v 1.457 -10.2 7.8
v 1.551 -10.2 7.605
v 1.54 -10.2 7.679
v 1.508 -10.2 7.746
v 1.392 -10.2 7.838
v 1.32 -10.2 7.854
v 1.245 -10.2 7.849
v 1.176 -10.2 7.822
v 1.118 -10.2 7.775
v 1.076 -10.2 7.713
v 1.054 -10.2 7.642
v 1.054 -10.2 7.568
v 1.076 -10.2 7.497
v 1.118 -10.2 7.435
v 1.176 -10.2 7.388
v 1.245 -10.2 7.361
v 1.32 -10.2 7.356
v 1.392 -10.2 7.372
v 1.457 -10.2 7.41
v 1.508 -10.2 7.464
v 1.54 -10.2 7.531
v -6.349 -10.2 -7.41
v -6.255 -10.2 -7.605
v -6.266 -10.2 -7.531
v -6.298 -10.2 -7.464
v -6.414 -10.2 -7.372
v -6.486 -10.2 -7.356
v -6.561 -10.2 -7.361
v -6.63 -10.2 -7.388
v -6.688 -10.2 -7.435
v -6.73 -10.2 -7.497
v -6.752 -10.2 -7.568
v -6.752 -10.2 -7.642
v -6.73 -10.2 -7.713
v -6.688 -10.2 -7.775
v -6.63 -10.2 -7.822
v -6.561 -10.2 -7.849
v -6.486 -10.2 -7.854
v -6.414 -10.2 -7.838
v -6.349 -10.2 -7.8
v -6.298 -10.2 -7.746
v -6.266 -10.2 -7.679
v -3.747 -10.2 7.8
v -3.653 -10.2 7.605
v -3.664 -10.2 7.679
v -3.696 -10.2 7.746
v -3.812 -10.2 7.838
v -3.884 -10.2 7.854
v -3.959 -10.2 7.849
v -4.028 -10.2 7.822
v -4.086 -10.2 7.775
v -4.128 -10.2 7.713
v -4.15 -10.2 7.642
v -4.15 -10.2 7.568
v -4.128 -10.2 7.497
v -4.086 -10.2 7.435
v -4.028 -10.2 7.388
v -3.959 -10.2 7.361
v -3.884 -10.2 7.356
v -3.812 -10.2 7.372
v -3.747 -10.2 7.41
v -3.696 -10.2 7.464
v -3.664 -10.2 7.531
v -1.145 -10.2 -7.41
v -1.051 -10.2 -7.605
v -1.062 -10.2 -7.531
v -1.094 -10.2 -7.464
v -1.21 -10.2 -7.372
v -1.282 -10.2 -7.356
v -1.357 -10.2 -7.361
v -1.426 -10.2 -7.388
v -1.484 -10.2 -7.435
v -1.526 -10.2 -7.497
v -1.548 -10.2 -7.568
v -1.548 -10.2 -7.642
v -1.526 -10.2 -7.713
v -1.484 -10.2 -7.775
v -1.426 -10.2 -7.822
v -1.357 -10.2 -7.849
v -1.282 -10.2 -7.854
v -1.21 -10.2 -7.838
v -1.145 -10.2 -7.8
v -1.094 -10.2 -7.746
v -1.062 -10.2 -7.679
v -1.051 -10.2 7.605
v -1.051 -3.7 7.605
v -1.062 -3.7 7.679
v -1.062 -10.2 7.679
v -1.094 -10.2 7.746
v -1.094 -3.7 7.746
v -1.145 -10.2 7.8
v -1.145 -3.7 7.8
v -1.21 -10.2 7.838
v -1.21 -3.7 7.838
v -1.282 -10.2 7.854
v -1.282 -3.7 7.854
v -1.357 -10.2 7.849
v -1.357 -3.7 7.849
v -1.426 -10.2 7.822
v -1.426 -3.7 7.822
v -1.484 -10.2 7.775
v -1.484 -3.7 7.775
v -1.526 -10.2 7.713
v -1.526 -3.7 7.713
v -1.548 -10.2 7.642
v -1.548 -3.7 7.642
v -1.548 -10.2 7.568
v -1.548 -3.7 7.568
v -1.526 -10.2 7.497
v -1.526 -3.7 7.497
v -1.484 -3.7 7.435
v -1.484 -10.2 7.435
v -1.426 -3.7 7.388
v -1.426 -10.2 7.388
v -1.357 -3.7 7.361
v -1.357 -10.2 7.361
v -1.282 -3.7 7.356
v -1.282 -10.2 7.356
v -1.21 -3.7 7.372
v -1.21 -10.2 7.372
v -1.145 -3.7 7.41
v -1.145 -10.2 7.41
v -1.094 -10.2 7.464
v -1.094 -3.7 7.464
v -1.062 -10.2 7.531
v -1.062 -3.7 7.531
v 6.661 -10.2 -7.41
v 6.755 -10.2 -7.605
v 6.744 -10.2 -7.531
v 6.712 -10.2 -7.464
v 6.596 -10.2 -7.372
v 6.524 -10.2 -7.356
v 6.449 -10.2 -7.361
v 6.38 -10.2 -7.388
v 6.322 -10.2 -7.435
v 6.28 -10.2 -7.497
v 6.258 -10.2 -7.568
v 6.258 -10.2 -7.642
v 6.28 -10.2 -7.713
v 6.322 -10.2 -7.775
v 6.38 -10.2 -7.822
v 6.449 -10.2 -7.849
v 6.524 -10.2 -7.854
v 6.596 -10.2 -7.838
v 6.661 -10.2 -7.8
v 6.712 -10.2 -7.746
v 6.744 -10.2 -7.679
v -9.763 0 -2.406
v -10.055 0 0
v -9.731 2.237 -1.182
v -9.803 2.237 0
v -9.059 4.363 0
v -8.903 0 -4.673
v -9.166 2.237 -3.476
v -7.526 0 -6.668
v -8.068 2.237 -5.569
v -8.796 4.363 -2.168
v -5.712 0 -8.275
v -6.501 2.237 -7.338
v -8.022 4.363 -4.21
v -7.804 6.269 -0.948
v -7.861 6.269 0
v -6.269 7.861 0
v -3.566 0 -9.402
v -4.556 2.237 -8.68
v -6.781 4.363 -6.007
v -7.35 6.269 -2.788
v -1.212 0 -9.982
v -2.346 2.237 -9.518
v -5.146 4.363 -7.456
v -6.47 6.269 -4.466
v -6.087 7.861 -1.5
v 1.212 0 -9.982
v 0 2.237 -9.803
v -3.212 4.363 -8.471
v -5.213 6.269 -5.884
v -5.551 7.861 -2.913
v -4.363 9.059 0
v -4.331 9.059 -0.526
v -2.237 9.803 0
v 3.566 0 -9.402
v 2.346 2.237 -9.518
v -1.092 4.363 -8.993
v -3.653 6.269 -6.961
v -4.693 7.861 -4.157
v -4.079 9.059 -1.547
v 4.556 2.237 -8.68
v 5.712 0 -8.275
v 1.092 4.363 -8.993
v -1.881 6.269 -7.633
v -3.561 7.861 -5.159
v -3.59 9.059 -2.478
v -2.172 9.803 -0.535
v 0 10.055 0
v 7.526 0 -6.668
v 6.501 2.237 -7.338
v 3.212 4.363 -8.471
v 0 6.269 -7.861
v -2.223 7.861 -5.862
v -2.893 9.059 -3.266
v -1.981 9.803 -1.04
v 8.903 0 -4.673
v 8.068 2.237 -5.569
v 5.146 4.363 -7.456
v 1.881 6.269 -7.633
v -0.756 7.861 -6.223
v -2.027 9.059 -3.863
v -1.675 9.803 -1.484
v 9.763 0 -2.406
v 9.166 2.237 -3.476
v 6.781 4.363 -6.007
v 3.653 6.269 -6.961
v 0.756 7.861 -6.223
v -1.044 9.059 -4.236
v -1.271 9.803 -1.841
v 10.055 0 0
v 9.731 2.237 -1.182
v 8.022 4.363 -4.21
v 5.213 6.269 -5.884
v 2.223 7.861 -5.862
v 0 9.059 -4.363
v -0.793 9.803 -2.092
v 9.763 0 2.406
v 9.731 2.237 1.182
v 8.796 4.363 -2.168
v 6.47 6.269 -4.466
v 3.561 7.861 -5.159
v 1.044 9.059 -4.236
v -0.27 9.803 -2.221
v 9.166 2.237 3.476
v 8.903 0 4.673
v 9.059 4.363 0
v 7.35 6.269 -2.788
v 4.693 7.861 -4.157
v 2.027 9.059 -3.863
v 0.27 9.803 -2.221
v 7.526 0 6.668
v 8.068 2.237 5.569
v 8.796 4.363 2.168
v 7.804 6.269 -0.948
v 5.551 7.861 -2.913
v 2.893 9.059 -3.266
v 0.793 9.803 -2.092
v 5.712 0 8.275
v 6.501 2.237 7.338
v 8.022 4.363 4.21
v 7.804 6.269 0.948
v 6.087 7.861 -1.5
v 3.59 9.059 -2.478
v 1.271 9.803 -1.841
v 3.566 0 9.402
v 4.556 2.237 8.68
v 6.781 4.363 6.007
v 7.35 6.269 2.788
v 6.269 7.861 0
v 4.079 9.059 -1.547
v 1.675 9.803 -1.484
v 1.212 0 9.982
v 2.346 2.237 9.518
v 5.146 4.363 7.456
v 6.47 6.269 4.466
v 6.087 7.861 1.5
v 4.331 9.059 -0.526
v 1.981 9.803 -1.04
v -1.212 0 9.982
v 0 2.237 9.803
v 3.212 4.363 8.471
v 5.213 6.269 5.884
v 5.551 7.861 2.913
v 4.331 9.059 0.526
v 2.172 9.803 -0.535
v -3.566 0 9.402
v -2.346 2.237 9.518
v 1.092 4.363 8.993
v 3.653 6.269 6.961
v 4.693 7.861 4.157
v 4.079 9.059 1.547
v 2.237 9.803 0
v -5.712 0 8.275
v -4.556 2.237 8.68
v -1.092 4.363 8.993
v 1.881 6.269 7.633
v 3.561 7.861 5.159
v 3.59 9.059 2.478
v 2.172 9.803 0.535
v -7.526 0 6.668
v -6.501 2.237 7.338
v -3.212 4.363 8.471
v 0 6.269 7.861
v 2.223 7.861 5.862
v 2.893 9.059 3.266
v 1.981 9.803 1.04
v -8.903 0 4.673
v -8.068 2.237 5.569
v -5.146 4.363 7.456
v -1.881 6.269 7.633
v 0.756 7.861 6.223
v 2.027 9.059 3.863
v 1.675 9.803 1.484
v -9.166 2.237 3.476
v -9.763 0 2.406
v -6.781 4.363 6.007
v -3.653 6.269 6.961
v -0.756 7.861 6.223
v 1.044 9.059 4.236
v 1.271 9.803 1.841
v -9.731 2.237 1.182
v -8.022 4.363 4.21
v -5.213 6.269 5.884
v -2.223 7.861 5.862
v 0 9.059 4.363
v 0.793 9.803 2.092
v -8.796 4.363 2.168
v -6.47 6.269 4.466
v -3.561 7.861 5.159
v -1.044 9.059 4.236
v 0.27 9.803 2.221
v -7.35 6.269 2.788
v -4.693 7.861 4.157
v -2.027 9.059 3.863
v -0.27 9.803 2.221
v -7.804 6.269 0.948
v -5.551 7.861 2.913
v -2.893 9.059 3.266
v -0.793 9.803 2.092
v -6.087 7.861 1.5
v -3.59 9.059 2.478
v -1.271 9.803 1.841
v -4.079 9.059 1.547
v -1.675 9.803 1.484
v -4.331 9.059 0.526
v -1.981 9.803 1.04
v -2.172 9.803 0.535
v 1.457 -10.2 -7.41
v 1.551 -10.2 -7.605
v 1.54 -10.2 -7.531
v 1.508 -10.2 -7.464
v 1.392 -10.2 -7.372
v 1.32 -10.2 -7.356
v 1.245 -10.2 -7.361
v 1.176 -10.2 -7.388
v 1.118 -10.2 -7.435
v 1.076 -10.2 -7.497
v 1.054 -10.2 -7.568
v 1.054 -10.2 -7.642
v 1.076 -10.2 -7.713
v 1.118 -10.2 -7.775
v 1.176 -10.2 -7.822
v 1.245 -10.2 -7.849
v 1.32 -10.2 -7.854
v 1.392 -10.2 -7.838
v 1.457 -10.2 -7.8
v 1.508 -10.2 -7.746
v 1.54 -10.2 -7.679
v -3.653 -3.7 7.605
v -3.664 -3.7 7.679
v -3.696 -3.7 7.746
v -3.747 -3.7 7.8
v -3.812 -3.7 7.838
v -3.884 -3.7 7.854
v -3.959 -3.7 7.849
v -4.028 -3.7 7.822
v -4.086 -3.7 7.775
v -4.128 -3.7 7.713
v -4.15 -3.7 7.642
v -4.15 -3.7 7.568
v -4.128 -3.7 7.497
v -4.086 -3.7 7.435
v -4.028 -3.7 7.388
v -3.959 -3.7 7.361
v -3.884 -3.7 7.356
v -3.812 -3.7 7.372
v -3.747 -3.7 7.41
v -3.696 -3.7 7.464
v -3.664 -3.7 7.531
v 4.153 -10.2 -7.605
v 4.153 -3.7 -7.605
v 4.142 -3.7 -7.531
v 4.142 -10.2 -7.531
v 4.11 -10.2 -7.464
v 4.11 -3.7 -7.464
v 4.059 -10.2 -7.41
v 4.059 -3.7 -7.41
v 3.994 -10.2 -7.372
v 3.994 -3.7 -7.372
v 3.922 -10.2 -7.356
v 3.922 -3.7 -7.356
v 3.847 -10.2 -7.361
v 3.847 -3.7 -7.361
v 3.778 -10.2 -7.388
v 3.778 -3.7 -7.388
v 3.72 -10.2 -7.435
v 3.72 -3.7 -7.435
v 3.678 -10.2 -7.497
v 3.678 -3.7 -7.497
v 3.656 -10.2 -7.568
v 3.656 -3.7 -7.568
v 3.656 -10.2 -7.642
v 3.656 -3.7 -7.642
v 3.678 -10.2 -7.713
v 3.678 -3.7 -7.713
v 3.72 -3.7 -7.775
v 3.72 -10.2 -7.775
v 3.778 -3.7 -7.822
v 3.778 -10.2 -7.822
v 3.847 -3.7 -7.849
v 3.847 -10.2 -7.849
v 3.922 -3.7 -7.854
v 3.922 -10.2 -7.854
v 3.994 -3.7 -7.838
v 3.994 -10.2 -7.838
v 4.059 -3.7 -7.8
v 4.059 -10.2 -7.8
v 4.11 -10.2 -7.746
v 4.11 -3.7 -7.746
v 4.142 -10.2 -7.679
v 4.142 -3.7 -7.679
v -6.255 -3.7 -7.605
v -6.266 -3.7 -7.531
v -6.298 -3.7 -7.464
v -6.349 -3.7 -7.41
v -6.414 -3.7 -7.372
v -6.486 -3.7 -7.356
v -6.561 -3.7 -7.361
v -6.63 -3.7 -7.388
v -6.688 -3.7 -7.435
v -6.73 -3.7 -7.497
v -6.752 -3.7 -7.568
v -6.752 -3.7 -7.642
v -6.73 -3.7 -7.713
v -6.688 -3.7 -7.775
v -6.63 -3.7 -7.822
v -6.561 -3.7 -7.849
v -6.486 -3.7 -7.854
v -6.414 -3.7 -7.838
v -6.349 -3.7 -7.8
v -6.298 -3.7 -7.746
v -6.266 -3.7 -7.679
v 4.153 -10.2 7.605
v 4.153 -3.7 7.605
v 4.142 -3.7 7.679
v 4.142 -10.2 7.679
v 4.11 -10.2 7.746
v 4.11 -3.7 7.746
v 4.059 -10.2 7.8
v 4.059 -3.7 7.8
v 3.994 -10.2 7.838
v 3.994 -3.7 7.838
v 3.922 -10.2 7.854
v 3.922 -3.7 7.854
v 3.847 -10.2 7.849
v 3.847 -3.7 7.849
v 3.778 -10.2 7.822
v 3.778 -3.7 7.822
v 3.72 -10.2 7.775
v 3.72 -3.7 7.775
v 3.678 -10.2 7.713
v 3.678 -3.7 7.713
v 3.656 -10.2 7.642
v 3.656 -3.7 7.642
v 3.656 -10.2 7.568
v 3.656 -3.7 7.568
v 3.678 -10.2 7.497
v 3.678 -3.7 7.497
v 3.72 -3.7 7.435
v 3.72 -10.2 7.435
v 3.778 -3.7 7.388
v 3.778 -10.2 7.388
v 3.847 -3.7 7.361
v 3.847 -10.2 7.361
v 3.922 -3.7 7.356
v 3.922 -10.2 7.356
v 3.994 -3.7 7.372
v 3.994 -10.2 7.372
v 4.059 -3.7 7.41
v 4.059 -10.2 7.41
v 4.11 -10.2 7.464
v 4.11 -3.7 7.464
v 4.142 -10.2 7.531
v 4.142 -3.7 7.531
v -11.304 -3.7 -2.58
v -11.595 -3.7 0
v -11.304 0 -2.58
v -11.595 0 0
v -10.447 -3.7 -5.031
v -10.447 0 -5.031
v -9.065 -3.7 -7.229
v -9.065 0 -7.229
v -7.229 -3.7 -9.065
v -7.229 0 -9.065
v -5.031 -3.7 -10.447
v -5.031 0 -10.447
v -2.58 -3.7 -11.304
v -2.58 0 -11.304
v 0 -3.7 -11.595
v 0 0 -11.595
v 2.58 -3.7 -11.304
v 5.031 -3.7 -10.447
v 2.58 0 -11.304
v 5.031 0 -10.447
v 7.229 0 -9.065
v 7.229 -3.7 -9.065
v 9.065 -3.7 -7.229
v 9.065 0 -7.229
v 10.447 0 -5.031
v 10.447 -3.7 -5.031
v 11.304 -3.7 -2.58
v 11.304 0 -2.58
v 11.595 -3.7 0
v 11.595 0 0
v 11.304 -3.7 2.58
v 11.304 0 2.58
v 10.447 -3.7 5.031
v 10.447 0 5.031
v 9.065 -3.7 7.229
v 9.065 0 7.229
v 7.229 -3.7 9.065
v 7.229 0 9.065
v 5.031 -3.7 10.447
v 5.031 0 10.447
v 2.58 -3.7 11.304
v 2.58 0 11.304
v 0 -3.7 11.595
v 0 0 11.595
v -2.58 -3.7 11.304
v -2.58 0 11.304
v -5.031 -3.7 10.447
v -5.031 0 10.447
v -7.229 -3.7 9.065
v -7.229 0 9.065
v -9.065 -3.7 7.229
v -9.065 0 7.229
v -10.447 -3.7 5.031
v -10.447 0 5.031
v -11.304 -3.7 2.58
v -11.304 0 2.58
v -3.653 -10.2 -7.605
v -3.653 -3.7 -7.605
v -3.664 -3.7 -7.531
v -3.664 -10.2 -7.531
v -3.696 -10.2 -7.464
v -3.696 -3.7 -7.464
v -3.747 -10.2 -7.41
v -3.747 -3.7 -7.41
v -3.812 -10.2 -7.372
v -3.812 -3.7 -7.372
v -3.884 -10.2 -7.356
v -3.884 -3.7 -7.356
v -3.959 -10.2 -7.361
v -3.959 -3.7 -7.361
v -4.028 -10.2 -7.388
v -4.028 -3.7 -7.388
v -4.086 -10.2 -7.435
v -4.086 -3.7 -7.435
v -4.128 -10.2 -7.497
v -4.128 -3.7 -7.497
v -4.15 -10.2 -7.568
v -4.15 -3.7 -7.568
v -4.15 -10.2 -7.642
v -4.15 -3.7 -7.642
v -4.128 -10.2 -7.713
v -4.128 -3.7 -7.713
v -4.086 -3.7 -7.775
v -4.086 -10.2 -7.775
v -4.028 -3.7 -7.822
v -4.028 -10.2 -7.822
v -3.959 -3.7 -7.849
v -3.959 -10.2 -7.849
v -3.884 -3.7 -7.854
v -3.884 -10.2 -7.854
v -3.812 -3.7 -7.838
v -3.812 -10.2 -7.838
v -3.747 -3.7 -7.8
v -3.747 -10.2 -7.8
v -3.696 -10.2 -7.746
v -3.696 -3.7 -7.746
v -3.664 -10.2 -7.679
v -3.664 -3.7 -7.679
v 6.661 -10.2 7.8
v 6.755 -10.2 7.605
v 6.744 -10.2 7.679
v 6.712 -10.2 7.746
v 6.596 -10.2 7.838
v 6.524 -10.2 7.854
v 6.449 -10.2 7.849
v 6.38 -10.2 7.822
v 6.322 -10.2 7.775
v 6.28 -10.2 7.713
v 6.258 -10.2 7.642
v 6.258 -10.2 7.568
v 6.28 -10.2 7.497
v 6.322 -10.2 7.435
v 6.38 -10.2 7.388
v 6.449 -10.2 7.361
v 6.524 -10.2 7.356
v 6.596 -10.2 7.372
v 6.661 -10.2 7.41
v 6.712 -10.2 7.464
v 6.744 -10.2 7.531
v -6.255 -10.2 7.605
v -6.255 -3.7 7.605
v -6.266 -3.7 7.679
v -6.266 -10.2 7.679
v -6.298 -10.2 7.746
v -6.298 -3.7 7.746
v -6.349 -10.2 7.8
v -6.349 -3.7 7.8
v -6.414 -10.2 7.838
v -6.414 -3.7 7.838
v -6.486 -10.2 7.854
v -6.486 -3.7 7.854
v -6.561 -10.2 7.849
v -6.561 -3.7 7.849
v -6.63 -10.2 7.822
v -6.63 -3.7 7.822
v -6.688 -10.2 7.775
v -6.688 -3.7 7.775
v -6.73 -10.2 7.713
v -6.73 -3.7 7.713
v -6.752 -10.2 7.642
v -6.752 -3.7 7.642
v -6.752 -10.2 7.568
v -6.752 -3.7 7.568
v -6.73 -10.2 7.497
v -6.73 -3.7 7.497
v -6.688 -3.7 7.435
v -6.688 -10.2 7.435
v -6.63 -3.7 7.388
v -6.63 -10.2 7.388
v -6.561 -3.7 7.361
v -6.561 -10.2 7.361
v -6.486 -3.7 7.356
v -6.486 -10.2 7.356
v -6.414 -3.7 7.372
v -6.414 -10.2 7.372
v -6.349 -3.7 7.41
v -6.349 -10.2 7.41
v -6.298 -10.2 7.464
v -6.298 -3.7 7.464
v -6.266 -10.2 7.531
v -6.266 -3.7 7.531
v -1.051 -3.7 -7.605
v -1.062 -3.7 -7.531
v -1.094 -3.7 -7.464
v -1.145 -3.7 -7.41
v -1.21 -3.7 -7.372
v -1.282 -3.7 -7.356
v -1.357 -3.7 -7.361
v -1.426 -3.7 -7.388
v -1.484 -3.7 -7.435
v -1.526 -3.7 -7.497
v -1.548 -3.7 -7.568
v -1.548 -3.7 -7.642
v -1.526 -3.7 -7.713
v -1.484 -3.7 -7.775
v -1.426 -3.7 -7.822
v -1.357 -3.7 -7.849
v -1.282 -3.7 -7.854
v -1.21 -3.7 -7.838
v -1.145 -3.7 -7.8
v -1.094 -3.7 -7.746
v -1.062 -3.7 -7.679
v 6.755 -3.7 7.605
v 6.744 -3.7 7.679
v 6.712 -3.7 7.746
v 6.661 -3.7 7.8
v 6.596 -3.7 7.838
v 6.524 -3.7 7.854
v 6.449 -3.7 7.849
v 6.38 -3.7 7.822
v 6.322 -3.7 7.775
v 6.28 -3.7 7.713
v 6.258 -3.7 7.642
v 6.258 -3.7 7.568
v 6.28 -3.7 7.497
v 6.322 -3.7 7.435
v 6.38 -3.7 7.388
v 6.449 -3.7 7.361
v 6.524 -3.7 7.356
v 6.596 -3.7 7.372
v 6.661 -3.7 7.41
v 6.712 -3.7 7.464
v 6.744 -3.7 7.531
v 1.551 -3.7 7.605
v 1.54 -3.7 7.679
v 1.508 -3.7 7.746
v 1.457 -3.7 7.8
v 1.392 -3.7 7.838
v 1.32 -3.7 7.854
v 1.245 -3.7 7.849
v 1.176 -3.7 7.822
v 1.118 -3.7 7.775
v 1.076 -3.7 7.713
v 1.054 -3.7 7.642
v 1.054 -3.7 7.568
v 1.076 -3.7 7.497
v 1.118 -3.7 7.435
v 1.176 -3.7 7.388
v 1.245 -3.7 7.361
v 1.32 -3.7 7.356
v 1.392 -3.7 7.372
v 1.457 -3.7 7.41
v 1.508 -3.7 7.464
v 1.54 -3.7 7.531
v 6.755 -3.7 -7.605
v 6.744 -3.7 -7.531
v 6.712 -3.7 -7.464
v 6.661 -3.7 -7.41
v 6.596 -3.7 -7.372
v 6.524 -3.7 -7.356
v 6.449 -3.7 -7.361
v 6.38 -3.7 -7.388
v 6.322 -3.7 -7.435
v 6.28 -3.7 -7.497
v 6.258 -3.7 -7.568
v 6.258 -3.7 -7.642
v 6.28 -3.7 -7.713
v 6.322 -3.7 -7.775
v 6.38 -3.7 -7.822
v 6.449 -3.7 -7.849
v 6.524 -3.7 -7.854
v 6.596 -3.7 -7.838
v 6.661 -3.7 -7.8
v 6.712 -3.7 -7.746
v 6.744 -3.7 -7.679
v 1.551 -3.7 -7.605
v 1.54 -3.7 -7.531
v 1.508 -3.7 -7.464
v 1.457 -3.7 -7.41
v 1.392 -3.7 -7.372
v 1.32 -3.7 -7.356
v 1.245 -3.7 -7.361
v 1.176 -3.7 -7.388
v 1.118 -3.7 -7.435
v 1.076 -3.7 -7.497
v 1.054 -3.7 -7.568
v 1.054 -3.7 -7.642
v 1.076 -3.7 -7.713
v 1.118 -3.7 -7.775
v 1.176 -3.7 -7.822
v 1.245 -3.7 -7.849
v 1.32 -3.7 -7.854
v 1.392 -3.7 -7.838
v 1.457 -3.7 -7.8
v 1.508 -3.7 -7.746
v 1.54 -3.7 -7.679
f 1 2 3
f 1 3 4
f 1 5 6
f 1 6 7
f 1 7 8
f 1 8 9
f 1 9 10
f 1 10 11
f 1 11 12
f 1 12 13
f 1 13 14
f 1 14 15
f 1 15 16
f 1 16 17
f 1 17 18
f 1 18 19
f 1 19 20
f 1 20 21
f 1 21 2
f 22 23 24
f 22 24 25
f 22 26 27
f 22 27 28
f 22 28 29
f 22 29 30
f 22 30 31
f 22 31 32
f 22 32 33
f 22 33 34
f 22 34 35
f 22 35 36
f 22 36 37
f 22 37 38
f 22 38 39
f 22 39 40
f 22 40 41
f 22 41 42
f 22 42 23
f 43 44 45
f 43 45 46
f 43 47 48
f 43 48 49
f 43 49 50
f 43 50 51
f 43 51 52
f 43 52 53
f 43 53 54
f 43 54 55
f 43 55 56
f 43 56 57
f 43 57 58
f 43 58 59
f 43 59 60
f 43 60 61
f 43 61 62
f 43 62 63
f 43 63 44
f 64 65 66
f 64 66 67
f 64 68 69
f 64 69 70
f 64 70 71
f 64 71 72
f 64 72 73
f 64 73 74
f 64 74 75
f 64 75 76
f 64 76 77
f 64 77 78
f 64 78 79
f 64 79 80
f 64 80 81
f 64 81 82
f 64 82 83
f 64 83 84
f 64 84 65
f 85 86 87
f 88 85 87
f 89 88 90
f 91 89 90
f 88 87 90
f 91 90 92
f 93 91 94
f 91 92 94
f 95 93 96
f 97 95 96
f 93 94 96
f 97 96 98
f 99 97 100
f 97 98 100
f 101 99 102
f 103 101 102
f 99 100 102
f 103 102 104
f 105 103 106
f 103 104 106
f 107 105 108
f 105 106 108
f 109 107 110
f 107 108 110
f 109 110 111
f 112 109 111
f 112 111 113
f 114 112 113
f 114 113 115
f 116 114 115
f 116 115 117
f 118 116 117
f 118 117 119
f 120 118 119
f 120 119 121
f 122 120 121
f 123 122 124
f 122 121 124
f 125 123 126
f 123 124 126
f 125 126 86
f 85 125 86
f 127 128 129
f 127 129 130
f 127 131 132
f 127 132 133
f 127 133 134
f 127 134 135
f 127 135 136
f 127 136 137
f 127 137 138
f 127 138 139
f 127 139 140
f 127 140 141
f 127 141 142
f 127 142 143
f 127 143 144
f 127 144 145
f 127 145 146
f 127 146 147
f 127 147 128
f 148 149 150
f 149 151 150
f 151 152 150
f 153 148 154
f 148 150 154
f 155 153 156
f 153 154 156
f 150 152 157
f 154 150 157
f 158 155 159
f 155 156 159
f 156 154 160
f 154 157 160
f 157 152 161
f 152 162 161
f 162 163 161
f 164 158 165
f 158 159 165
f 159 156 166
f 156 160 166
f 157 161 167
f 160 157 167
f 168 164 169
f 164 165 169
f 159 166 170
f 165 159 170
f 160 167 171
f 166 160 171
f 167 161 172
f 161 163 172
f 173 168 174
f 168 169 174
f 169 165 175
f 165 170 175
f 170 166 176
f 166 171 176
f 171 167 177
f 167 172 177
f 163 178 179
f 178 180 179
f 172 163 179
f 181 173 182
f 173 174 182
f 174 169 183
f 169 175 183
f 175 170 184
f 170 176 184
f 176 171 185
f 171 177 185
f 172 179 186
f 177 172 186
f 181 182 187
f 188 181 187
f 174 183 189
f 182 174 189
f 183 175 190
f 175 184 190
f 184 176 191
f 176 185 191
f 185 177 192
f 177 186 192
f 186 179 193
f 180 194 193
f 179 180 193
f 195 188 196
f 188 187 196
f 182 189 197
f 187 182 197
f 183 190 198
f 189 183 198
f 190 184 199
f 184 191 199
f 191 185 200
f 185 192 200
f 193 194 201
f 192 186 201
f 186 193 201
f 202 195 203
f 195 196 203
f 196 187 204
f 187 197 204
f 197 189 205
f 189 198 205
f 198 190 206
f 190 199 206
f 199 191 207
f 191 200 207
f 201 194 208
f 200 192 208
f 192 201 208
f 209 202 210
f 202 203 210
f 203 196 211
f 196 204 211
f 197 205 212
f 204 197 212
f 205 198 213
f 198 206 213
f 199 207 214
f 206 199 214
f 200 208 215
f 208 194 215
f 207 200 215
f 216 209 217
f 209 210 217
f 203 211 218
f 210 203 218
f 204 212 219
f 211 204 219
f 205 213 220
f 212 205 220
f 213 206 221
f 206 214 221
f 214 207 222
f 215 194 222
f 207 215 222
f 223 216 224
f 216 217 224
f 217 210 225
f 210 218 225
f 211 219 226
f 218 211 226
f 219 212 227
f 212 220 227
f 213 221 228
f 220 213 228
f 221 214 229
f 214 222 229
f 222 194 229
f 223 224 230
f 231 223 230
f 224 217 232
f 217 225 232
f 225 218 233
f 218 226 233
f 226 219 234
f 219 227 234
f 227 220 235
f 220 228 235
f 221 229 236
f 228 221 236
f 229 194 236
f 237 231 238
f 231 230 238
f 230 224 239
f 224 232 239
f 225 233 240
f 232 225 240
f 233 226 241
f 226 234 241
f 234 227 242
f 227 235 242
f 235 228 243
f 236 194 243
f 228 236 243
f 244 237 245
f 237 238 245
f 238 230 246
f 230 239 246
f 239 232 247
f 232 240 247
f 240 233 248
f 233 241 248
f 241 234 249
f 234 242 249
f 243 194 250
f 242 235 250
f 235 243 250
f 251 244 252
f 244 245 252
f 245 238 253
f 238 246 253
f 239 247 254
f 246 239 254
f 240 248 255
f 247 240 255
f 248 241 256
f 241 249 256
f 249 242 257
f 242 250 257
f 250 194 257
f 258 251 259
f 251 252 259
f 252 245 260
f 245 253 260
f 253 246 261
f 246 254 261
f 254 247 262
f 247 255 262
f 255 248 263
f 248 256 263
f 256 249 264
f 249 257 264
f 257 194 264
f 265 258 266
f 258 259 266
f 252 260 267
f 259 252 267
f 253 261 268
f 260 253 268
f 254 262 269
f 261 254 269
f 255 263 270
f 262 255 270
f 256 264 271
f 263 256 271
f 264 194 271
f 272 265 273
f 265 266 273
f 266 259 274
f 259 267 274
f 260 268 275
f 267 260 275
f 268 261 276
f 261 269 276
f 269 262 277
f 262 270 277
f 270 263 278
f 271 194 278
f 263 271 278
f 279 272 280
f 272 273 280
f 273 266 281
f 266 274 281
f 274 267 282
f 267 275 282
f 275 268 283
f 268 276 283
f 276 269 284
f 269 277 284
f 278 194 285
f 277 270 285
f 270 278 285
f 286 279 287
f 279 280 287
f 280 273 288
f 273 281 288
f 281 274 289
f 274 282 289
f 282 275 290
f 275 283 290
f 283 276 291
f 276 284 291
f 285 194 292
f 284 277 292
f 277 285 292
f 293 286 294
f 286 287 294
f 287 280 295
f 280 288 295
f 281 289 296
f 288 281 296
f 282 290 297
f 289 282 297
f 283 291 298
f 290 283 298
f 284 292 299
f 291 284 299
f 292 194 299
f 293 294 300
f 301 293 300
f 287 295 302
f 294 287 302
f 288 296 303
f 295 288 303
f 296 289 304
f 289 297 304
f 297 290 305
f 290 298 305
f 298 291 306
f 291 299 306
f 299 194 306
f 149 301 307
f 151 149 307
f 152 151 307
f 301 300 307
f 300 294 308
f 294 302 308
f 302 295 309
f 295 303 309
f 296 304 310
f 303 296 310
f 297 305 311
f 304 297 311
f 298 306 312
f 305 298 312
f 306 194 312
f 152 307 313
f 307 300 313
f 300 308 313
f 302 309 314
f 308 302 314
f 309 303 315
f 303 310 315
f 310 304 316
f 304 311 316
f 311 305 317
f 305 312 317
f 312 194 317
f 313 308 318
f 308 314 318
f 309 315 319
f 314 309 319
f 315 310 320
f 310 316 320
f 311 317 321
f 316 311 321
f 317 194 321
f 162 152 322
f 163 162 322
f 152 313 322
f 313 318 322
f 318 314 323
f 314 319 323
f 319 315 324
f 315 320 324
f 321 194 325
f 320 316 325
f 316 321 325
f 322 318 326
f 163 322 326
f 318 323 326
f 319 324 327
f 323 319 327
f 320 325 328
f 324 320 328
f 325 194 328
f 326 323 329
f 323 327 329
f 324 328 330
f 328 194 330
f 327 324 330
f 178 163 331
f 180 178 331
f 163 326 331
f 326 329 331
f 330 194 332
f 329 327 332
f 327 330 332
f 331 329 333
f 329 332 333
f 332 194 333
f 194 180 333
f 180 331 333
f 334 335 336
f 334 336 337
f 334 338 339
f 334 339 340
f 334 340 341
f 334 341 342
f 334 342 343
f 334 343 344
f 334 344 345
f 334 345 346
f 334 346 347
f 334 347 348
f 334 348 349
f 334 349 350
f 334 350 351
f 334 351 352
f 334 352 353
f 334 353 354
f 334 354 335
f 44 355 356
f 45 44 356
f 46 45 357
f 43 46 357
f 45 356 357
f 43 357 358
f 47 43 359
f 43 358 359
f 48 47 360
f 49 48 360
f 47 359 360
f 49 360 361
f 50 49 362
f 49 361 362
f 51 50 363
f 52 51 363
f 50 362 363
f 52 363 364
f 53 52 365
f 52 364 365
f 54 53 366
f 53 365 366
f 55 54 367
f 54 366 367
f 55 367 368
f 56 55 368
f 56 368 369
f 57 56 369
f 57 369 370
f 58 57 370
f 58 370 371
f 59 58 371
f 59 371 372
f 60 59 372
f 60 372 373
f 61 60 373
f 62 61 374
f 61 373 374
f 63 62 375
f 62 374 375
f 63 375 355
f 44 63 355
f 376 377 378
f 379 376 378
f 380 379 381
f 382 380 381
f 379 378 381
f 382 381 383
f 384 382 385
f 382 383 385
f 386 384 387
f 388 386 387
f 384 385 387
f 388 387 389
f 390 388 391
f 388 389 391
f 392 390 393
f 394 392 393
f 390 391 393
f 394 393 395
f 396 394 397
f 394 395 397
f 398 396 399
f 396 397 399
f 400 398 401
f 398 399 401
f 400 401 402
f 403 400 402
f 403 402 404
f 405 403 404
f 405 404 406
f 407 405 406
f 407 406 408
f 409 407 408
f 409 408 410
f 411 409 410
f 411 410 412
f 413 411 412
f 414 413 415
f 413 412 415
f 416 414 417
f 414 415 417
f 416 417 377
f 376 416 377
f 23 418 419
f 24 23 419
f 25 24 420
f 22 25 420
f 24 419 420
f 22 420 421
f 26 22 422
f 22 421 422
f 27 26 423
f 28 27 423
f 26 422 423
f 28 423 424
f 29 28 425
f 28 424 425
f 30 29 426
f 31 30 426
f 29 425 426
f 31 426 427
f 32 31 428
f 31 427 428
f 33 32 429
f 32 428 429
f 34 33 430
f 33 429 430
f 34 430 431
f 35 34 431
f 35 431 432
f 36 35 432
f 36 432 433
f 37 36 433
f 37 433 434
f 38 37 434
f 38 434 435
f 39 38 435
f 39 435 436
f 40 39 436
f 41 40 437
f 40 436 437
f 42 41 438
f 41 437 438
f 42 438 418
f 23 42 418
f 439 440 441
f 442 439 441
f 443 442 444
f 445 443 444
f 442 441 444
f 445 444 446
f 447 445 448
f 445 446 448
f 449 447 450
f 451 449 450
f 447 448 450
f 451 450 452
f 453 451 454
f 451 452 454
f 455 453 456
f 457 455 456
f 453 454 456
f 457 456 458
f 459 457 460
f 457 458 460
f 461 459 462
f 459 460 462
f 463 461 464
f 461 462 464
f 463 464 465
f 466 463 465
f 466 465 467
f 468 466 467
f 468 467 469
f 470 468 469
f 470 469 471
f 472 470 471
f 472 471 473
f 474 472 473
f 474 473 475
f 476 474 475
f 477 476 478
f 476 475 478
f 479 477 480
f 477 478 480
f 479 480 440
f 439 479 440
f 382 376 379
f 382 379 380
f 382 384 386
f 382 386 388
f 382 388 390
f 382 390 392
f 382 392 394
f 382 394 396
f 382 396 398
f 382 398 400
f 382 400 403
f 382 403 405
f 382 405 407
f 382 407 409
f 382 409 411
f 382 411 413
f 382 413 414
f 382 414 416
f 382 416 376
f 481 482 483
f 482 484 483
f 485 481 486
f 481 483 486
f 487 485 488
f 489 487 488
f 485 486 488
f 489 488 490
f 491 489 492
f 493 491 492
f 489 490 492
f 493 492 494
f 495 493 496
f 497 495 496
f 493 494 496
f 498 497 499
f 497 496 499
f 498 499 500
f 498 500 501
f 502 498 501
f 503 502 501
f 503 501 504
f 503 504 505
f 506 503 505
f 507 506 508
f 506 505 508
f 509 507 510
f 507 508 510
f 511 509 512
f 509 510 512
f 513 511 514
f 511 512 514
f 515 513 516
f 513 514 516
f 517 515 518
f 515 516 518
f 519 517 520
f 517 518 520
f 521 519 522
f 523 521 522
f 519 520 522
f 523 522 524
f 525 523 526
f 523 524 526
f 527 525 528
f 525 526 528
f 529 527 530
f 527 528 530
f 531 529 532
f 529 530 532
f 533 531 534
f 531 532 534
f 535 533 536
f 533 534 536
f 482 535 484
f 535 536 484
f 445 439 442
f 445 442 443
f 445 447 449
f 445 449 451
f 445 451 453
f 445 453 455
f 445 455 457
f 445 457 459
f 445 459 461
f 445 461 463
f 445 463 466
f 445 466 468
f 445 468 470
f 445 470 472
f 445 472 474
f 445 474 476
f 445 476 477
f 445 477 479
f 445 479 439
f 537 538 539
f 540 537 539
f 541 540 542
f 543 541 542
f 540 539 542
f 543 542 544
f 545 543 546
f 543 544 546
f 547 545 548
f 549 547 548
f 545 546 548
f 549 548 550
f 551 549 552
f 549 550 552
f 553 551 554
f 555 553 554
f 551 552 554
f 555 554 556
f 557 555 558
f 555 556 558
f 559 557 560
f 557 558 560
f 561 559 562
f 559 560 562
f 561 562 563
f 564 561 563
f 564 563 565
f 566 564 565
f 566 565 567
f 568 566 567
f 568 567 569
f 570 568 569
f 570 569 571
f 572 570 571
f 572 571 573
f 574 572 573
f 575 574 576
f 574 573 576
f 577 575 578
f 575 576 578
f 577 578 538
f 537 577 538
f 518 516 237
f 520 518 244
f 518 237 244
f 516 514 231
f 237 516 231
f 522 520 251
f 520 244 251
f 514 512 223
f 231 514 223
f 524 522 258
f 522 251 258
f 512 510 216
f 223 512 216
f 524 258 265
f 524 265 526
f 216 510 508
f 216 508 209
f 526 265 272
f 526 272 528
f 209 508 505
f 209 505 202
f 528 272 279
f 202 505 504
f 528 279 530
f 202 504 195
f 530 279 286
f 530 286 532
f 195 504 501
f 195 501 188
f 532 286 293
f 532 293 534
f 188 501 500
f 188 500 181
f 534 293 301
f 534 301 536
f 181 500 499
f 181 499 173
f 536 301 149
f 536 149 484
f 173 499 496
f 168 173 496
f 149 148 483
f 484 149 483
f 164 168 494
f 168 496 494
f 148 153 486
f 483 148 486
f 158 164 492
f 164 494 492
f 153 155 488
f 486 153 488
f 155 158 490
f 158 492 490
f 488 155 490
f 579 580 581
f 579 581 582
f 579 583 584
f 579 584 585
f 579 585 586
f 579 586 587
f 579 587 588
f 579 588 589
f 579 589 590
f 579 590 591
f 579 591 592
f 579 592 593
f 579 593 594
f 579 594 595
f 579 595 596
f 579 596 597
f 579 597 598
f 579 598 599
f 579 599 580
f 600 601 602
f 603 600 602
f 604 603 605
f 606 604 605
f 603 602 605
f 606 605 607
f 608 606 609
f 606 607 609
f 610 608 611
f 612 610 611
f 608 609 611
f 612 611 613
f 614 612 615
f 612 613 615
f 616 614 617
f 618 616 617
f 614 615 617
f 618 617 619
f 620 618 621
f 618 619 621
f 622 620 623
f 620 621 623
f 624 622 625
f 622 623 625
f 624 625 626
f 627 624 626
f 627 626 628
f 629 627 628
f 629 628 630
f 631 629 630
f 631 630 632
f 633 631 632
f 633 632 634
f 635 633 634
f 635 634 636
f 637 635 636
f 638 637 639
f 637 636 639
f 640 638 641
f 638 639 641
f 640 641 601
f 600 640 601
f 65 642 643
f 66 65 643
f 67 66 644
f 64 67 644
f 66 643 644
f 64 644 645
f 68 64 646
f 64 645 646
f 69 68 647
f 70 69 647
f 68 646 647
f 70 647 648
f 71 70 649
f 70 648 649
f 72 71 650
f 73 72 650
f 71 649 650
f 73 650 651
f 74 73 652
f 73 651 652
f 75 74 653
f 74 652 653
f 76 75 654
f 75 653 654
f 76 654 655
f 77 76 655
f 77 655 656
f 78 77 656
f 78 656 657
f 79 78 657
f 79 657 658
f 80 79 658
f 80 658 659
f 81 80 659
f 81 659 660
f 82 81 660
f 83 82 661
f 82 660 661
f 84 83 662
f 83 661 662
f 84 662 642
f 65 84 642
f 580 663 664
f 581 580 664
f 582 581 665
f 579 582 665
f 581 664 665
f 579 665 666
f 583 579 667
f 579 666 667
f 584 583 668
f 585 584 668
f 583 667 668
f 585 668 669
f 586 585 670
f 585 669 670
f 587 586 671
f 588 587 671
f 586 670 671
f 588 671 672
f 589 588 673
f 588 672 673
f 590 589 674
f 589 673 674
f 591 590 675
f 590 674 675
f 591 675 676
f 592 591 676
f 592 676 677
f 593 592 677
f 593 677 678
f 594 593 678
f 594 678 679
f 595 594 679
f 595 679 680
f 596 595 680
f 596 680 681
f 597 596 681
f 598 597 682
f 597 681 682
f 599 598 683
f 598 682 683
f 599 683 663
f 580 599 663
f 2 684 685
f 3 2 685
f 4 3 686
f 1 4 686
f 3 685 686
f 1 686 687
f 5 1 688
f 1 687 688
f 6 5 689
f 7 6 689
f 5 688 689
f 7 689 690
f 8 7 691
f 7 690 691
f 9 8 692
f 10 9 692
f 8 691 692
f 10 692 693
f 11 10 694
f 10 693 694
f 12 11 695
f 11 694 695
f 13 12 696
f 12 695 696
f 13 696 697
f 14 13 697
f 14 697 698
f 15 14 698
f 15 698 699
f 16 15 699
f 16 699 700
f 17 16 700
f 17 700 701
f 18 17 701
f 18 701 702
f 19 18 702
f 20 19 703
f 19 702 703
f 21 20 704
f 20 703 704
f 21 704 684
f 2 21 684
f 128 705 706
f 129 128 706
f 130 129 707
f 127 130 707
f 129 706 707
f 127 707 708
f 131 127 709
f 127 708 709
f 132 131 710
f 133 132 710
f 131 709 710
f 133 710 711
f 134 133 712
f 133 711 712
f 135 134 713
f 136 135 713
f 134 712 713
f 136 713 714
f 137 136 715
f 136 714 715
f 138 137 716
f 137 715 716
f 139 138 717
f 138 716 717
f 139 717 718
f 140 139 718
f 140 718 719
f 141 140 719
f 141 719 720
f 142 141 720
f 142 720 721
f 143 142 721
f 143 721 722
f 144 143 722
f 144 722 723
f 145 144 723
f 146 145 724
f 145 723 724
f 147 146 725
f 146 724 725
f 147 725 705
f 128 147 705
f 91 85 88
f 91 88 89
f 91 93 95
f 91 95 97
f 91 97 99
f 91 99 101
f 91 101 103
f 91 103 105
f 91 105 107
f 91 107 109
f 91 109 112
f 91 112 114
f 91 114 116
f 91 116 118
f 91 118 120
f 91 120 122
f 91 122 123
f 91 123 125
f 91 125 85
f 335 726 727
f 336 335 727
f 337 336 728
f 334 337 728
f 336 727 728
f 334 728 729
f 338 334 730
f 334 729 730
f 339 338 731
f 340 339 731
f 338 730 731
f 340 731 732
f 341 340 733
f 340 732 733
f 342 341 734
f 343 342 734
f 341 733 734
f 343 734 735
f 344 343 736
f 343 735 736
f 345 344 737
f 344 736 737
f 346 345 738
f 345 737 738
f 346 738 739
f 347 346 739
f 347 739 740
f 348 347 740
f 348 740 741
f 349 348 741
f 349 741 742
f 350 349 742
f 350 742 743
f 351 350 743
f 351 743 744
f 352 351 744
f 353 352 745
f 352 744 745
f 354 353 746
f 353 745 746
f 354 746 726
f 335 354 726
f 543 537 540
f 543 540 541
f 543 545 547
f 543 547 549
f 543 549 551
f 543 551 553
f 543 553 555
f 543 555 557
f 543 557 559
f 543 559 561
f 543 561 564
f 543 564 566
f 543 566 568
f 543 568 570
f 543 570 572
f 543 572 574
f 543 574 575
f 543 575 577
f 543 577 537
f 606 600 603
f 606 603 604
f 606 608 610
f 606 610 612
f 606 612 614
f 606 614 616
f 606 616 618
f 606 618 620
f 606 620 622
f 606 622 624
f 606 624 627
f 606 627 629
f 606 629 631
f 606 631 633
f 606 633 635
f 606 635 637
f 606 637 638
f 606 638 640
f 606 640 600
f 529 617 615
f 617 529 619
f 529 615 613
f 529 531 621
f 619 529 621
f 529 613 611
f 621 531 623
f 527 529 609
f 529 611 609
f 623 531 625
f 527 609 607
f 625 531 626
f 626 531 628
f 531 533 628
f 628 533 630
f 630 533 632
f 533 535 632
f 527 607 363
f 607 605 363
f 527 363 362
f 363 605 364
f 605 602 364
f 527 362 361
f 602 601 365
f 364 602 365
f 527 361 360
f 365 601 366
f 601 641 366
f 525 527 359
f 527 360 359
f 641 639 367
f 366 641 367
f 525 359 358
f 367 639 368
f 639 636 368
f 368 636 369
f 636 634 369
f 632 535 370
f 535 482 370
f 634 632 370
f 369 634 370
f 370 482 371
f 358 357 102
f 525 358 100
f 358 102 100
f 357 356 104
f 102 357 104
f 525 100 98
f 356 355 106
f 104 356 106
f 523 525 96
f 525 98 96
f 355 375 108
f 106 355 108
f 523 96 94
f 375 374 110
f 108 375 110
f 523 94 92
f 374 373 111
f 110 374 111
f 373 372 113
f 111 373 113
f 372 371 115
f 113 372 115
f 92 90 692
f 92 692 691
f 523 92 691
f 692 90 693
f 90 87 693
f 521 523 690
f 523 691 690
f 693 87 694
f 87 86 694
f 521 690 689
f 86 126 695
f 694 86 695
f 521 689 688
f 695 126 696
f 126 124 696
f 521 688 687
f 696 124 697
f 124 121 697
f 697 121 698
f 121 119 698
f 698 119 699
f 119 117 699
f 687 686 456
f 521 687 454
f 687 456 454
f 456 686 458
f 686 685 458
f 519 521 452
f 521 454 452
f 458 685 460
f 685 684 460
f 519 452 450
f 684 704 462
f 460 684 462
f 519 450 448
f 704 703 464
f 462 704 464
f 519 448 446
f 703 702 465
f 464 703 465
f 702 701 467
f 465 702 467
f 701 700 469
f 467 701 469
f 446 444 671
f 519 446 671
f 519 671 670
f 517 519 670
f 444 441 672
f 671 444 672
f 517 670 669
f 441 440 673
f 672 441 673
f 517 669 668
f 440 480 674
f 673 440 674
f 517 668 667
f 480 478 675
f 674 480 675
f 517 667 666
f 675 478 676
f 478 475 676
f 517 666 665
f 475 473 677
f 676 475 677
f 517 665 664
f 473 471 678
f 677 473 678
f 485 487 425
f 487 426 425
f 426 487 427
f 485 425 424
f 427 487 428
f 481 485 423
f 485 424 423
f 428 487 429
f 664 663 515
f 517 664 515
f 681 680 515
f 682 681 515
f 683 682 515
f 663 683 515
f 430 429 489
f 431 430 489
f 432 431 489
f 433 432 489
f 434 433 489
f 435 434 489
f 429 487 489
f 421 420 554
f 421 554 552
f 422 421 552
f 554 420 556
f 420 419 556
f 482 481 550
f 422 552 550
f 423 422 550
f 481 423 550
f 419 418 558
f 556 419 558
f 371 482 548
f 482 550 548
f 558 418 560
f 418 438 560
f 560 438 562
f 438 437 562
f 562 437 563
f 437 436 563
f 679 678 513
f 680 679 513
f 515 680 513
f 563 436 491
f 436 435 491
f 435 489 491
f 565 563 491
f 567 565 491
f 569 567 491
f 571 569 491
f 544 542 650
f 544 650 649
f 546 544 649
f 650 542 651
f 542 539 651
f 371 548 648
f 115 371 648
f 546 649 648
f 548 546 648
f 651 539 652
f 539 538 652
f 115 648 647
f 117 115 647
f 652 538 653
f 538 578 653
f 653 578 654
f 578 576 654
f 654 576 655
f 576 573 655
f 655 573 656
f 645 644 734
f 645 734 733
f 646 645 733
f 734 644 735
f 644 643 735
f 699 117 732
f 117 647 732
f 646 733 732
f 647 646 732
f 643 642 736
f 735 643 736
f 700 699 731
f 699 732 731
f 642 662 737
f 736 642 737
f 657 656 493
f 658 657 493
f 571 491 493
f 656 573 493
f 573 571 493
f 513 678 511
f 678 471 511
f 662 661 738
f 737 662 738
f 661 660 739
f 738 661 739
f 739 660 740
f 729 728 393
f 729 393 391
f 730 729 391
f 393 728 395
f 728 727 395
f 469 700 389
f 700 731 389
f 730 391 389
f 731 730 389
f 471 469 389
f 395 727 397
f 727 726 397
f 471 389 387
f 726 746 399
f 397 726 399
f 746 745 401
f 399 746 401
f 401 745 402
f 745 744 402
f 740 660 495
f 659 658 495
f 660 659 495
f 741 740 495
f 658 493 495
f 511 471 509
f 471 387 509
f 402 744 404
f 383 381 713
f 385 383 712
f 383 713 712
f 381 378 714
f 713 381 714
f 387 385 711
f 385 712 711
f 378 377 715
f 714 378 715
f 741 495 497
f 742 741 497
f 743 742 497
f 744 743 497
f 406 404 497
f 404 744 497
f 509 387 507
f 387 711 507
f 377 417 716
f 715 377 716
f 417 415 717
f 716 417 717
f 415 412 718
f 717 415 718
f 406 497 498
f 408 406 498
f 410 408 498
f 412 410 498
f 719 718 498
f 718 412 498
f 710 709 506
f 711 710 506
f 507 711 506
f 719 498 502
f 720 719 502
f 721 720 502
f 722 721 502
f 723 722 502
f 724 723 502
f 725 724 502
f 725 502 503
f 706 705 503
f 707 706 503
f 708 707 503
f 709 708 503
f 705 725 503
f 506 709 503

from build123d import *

# Parameters (mm, degrees)
SKETCH2_R           = 0.25
BOSS_EXTRUDE1_DEPTH = 6.5


with BuildPart() as part:
    # Sketch1 → Revolve1 (revolve)
    with BuildSketch(Plane.XY):
        with BuildLine():
            Line((0, 10.055), (0, 0))
            Line((0, 0), (0, -3.7))
            Line((0, -3.7), (-11.595, -3.7))
            Line((-11.595, -3.7), (-11.595, 0))
            Line((-11.595, 0), (-10.055, 0))
            ThreePointArc((-10.055, 0), (-7.109958685, 7.109958685), (0, 10.055))
        make_face()
    revolve(axis=Axis((0, 10.055, 0), (0, -1, 0)))

    # Sketch2 → Boss-Extrude1 (add)
    with BuildSketch(Plane.XZ.offset(3.7)):
        with Locations((-6.505, 7.605)):
            Circle(SKETCH2_R)
        with Locations((-3.903, 7.605)):
            Circle(SKETCH2_R)
        with Locations((-1.301, 7.605)):
            Circle(SKETCH2_R)
        with Locations((1.301, 7.605)):
            Circle(SKETCH2_R)
        with Locations((3.903, 7.605)):
            Circle(SKETCH2_R)
        with Locations((6.505, 7.605)):
            Circle(SKETCH2_R)
        with Locations((-3.903, -7.605)):
            Circle(SKETCH2_R)
        with Locations((-1.301, -7.605)):
            Circle(SKETCH2_R)
        with Locations((1.301, -7.605)):
            Circle(SKETCH2_R)
        with Locations((3.903, -7.605)):
            Circle(SKETCH2_R)
        with Locations((6.505, -7.605)):
            Circle(SKETCH2_R)
        with Locations((-6.505, -7.605)):
            Circle(SKETCH2_R)
    extrude(amount=BOSS_EXTRUDE1_DEPTH)


solid = part.part
